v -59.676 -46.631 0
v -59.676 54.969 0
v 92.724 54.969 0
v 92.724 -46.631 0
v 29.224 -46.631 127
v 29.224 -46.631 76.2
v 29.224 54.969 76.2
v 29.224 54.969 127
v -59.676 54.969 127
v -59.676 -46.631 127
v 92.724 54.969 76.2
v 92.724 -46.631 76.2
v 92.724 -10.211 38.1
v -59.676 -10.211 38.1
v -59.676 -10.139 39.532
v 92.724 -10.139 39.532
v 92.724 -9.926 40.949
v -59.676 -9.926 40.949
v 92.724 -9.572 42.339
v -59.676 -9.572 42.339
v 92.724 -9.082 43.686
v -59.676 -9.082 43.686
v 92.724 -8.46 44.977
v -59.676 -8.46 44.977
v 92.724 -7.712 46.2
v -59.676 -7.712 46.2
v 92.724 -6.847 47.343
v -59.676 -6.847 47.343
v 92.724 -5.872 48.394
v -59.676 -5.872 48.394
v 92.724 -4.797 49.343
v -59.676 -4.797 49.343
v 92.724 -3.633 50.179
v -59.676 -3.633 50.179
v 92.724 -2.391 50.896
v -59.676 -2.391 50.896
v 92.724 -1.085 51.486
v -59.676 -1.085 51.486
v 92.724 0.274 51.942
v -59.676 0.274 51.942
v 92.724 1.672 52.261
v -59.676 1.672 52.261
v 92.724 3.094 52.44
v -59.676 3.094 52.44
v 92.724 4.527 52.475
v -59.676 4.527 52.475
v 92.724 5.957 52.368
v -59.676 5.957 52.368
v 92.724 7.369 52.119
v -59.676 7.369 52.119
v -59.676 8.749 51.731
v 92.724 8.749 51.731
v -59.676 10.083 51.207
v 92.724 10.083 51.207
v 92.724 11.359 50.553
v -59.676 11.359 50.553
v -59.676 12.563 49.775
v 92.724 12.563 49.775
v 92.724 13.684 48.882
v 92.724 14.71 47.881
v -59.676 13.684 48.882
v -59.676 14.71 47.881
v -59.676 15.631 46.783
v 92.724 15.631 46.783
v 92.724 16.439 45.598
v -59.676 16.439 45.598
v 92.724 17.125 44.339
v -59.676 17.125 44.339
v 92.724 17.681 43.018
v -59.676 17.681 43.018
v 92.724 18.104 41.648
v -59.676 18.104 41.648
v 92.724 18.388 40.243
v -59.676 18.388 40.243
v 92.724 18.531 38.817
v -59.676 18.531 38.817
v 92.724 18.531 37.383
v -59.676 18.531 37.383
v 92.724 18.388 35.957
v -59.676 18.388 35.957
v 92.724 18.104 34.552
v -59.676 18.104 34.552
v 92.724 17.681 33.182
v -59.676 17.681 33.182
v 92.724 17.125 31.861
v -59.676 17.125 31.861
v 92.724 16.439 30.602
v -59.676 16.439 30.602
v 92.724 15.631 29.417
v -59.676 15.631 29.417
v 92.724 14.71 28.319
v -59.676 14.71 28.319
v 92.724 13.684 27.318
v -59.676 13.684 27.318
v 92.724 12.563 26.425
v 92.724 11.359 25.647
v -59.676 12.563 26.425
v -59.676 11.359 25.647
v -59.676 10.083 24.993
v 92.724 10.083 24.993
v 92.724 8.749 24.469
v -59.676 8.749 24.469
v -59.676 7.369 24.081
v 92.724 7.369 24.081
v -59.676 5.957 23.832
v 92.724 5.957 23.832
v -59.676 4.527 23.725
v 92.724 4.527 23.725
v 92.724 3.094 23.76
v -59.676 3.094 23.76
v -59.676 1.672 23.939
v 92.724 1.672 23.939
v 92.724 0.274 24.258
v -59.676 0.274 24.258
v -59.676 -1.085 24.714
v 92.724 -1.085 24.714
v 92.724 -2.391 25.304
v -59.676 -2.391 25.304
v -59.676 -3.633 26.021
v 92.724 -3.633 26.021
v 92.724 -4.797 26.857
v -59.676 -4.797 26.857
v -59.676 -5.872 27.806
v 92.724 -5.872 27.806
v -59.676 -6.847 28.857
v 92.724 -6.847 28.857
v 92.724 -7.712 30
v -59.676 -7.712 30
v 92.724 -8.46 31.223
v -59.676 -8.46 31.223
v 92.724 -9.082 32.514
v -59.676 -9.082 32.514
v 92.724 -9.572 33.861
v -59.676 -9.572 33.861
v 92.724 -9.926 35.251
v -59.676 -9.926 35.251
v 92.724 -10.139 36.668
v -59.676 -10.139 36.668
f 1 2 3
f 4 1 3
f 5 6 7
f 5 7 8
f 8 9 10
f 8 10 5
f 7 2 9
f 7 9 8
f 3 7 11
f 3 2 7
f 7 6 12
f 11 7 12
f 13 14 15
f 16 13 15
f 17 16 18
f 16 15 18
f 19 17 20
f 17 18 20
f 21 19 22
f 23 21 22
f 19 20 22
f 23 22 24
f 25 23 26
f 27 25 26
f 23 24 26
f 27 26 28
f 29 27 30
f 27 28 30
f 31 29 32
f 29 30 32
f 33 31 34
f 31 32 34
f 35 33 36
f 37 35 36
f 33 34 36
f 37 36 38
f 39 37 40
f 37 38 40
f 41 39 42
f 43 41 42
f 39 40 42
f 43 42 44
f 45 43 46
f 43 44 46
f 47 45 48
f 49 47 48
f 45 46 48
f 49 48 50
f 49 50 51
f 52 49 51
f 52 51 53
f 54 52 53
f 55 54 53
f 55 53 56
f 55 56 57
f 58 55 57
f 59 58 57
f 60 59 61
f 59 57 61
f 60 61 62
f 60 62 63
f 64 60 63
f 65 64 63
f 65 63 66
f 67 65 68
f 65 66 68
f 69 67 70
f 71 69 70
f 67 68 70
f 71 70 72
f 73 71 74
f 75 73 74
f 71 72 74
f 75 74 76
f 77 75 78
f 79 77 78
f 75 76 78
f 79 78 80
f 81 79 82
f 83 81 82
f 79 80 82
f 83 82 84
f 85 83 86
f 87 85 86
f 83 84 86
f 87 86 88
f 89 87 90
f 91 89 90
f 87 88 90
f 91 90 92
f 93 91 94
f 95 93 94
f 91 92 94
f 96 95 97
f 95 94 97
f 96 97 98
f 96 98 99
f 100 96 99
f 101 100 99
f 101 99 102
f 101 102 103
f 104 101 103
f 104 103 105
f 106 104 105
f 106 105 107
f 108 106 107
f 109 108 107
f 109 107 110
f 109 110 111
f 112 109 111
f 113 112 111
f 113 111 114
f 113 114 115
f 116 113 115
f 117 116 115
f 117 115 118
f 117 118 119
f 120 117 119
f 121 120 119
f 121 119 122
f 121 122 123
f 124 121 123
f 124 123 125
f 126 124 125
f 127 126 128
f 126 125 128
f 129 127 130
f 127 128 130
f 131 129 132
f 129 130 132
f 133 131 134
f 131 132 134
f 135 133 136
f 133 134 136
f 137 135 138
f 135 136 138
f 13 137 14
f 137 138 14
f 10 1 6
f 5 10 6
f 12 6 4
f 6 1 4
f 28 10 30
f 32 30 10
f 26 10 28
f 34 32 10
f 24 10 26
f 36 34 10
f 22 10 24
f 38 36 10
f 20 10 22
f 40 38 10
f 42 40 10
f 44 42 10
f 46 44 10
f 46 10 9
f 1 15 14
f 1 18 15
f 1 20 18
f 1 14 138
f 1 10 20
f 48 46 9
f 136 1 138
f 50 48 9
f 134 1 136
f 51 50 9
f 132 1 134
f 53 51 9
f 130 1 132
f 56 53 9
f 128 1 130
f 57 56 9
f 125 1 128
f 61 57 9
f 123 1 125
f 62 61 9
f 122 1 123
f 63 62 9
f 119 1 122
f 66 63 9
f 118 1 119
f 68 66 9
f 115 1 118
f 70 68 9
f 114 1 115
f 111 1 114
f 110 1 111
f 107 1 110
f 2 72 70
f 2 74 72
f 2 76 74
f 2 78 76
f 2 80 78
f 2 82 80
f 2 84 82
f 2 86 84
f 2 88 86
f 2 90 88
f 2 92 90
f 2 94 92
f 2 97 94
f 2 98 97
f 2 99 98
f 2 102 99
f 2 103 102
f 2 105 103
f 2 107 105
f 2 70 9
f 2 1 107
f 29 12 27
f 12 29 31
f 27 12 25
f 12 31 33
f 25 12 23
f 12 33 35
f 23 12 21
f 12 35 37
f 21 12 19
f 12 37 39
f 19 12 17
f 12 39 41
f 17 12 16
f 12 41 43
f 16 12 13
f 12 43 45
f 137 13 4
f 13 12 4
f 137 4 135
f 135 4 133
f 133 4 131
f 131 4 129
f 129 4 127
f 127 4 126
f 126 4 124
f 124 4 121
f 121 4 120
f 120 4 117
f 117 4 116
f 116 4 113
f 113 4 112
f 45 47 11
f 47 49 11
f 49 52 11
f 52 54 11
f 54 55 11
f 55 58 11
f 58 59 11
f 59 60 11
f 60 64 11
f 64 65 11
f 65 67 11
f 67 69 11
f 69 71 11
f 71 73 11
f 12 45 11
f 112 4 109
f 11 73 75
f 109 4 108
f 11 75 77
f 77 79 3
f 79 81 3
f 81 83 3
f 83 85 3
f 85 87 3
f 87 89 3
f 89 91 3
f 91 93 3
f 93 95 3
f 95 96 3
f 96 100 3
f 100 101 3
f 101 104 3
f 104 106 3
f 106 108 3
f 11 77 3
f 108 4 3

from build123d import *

# Parameters (mm, degrees)
F0_W     = 152.4
F0_H     = 101.6
F1_DEPTH = 127
F2_W     = 63.5
F2_H     = 50.8
F3_DEPTH = 101.6
F5_R     = 14.379735
F6_DEPTH = 152.4


with BuildPart() as f1:
    # F0 (on Top) → F1 (new body)
    with BuildSketch(Plane.XY):
        with Locations((16.524124, 4.168936)):
            Rectangle(F0_W, F0_H)
    extrude(amount=F1_DEPTH)

    # F2 (on face) → F3 (cut)
    with BuildSketch(Plane.XZ.offset(46.631064)):
        with Locations((60.974124, 101.6)):
            Rectangle(F2_W, F2_H)
    extrude(amount=-F3_DEPTH, mode=Mode.SUBTRACT)

    # F5 (on face) → F6 (cut)
    with BuildSketch(Plane(origin=(-59.675876, 0, 0), x_dir=(0, -1, 0), z_dir=(-1, 0, 0))):
        with Locations((-4.168936, 38.1)):
            Circle(F5_R)
    extrude(amount=-F6_DEPTH, mode=Mode.SUBTRACT)


solid = f1.part
